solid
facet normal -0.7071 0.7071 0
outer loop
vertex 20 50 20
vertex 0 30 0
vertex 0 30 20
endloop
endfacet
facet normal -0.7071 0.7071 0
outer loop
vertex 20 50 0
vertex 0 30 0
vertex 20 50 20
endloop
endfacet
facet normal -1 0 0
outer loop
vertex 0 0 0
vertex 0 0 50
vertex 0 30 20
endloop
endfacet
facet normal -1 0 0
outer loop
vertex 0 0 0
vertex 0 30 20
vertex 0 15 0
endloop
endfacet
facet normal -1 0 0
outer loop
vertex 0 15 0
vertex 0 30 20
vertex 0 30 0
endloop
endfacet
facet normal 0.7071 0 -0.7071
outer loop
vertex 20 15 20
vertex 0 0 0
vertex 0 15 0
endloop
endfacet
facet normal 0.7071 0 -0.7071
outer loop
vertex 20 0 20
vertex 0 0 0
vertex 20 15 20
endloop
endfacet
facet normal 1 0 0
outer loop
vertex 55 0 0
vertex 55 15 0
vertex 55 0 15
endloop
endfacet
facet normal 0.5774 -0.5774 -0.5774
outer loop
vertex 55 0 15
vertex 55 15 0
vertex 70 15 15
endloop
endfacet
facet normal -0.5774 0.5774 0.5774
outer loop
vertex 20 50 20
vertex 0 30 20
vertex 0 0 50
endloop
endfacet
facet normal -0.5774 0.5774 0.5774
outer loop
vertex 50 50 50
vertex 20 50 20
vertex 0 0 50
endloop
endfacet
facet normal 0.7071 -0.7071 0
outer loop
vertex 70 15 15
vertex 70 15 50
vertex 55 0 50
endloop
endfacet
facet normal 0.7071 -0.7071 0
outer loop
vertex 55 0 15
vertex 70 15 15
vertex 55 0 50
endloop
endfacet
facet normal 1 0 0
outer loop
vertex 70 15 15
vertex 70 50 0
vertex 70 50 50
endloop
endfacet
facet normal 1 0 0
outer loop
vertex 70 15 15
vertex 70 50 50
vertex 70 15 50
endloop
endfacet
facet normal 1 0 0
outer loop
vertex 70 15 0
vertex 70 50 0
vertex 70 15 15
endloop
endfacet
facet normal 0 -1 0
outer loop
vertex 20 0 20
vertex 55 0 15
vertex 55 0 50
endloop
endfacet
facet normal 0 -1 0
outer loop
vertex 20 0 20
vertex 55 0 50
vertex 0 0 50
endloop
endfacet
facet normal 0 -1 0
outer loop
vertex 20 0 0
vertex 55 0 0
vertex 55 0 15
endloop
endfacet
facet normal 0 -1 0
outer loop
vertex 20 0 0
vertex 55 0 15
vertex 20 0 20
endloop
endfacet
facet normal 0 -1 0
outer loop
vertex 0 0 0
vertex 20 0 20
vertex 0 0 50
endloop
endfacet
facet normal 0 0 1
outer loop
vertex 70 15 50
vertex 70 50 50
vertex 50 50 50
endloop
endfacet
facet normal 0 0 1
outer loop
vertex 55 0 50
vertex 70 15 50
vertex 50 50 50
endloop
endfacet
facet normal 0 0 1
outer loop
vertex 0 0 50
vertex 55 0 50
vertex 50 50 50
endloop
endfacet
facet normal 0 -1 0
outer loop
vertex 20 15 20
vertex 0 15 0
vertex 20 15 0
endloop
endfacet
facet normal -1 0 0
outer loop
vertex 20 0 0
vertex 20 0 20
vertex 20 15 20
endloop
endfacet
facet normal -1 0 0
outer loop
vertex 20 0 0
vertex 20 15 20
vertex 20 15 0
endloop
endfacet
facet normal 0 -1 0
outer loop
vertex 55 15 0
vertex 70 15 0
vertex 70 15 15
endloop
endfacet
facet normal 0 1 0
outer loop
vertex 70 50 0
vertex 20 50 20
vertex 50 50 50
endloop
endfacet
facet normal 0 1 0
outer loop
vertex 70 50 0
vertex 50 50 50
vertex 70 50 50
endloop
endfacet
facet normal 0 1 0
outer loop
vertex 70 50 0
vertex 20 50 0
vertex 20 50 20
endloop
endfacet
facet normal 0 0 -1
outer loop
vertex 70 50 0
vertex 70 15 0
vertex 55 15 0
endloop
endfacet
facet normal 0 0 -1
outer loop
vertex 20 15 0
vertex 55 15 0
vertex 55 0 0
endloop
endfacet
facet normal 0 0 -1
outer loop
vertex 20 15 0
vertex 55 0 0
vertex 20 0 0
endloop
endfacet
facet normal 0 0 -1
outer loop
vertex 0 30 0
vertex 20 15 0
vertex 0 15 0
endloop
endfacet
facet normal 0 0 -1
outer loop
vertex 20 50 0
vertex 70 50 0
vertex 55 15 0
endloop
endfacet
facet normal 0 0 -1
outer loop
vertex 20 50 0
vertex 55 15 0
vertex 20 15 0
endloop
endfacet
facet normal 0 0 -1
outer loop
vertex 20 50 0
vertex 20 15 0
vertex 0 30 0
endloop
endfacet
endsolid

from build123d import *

# Parameters (mm, degrees)
BOSS_EXTRUDE1_DEPTH = 50
CUT_EXTRUDE2_DEPTH  = 30
CUT_EXTRUDE3_DEPTH  = 15
BOSS_EXTRUDE4_DEPTH = 15
BOSS_EXTRUDE6_DEPTH = 52
BOSS_EXTRUDE7_DEPTH = 52
CUT_EXTRUDE6_DEPTH  = 52
BOSS_EXTRUDE8_DEPTH = 30
BOSS_EXTRUDE9_DEPTH = 15
CUT_EXTRUDE7_DEPTH  = 15
CUT_EXTRUDE8_DEPTH  = 15


with BuildPart() as part:
    # Sketch1 → Boss-Extrude1 (new body)
    with BuildSketch(Plane.XY):
        Polygon((0, 0), (0, 30), (20, 50), (70, 50), (70, 15), (55, 0), align=None)
    extrude(amount=BOSS_EXTRUDE1_DEPTH)

    # Sketch2 → Cut-Extrude2 (cut)
    with BuildSketch(Plane.XY.offset(50)):
        Polygon((0, 0), (50, 50), (20, 50), (0, 30), align=None)
    extrude(amount=-CUT_EXTRUDE2_DEPTH, mode=Mode.SUBTRACT)

    # Sketch4 → Cut-Extrude3 (cut)
    with BuildSketch(Plane(origin=(0, 0, 0), x_dir=(-1, 0, 0), z_dir=(0, 0, -1))):
        Polygon((-70, 15), (-55, 15), (-55, 0), align=None)
    extrude(amount=-CUT_EXTRUDE3_DEPTH, mode=Mode.SUBTRACT)

    # Sketch7 → Boss-Extrude4 (add)
    with BuildSketch(Plane(origin=(13.333333333, -13.333333333, -13.333333333), x_dir=(-0.816496581, -0.40824829, -0.40824829), z_dir=(0.577350269, -0.577350269, -0.577350269))):
        Polygon((-51.031036308, -10.606601718), (-69.402209379, 0), (-51.031036308, 10.606601718), align=None)
    extrude(amount=-BOSS_EXTRUDE4_DEPTH)

    # Sketch11 → Boss-Extrude6 (add)
    with BuildSketch(Plane.ZY):
        Polygon((20, 30), (50, 0), (20, 0), align=None)
    extrude(amount=-BOSS_EXTRUDE6_DEPTH)

    # Sketch12 → Boss-Extrude7 (add)
    with BuildSketch(Plane(origin=(0, 50, 0), x_dir=(1, 0, 0), z_dir=(0, 1, 0))):
        Polygon((20, -20), (50, -50), (50, -20), align=None)
    extrude(amount=-BOSS_EXTRUDE7_DEPTH)

    # Sketch13 → Cut-Extrude6 (cut)
    with BuildSketch(Plane.XZ):
        Polygon((20, 20), (50, 20), (50, 50), align=None)
    extrude(amount=CUT_EXTRUDE6_DEPTH, mode=Mode.SUBTRACT)

    # Sketch14 → Boss-Extrude8 (add)
    with BuildSketch(Plane(origin=(-16.666666667, 16.666666667, 16.666666667), x_dir=(-0.816496581, -0.40824829, -0.40824829), z_dir=(0.577350269, -0.577350269, -0.577350269))):
        Polygon((-20.412414523, 7.071067812), (-44.907311951, 21.213203436), (-81.649658093, 0), align=None)
    extrude(amount=BOSS_EXTRUDE8_DEPTH)

    # Sketch15 → Boss-Extrude9 (add)
    with BuildSketch(Plane(origin=(-16.666666667, 16.666666667, 16.666666667), x_dir=(0.816496581, 0.40824829, 0.40824829), z_dir=(-0.577350269, 0.577350269, 0.577350269))):
        Polygon((20.412414523, -35.355339059), (81.649658093, 0), (20.412414523, 7.071067812), align=None)
    extrude(amount=-BOSS_EXTRUDE9_DEPTH)

    # Sketch16 → Cut-Extrude7 (cut)
    with BuildSketch(Plane.XZ):
        Polygon((0, 50), (8.660254038, 32.679491924), (17.320508076, 41.339745962), align=None)
    extrude(amount=CUT_EXTRUDE7_DEPTH, mode=Mode.SUBTRACT)

    # Sketch17 → Cut-Extrude8 (cut)
    with BuildSketch(Plane(origin=(0, 0, 0), x_dir=(-1, 0, 0), z_dir=(0, -1, 0))):
        Polygon((0, 0), (-20, -20), (-20, 0), align=None)
    extrude(amount=-CUT_EXTRUDE8_DEPTH, mode=Mode.SUBTRACT)


solid = part.part
